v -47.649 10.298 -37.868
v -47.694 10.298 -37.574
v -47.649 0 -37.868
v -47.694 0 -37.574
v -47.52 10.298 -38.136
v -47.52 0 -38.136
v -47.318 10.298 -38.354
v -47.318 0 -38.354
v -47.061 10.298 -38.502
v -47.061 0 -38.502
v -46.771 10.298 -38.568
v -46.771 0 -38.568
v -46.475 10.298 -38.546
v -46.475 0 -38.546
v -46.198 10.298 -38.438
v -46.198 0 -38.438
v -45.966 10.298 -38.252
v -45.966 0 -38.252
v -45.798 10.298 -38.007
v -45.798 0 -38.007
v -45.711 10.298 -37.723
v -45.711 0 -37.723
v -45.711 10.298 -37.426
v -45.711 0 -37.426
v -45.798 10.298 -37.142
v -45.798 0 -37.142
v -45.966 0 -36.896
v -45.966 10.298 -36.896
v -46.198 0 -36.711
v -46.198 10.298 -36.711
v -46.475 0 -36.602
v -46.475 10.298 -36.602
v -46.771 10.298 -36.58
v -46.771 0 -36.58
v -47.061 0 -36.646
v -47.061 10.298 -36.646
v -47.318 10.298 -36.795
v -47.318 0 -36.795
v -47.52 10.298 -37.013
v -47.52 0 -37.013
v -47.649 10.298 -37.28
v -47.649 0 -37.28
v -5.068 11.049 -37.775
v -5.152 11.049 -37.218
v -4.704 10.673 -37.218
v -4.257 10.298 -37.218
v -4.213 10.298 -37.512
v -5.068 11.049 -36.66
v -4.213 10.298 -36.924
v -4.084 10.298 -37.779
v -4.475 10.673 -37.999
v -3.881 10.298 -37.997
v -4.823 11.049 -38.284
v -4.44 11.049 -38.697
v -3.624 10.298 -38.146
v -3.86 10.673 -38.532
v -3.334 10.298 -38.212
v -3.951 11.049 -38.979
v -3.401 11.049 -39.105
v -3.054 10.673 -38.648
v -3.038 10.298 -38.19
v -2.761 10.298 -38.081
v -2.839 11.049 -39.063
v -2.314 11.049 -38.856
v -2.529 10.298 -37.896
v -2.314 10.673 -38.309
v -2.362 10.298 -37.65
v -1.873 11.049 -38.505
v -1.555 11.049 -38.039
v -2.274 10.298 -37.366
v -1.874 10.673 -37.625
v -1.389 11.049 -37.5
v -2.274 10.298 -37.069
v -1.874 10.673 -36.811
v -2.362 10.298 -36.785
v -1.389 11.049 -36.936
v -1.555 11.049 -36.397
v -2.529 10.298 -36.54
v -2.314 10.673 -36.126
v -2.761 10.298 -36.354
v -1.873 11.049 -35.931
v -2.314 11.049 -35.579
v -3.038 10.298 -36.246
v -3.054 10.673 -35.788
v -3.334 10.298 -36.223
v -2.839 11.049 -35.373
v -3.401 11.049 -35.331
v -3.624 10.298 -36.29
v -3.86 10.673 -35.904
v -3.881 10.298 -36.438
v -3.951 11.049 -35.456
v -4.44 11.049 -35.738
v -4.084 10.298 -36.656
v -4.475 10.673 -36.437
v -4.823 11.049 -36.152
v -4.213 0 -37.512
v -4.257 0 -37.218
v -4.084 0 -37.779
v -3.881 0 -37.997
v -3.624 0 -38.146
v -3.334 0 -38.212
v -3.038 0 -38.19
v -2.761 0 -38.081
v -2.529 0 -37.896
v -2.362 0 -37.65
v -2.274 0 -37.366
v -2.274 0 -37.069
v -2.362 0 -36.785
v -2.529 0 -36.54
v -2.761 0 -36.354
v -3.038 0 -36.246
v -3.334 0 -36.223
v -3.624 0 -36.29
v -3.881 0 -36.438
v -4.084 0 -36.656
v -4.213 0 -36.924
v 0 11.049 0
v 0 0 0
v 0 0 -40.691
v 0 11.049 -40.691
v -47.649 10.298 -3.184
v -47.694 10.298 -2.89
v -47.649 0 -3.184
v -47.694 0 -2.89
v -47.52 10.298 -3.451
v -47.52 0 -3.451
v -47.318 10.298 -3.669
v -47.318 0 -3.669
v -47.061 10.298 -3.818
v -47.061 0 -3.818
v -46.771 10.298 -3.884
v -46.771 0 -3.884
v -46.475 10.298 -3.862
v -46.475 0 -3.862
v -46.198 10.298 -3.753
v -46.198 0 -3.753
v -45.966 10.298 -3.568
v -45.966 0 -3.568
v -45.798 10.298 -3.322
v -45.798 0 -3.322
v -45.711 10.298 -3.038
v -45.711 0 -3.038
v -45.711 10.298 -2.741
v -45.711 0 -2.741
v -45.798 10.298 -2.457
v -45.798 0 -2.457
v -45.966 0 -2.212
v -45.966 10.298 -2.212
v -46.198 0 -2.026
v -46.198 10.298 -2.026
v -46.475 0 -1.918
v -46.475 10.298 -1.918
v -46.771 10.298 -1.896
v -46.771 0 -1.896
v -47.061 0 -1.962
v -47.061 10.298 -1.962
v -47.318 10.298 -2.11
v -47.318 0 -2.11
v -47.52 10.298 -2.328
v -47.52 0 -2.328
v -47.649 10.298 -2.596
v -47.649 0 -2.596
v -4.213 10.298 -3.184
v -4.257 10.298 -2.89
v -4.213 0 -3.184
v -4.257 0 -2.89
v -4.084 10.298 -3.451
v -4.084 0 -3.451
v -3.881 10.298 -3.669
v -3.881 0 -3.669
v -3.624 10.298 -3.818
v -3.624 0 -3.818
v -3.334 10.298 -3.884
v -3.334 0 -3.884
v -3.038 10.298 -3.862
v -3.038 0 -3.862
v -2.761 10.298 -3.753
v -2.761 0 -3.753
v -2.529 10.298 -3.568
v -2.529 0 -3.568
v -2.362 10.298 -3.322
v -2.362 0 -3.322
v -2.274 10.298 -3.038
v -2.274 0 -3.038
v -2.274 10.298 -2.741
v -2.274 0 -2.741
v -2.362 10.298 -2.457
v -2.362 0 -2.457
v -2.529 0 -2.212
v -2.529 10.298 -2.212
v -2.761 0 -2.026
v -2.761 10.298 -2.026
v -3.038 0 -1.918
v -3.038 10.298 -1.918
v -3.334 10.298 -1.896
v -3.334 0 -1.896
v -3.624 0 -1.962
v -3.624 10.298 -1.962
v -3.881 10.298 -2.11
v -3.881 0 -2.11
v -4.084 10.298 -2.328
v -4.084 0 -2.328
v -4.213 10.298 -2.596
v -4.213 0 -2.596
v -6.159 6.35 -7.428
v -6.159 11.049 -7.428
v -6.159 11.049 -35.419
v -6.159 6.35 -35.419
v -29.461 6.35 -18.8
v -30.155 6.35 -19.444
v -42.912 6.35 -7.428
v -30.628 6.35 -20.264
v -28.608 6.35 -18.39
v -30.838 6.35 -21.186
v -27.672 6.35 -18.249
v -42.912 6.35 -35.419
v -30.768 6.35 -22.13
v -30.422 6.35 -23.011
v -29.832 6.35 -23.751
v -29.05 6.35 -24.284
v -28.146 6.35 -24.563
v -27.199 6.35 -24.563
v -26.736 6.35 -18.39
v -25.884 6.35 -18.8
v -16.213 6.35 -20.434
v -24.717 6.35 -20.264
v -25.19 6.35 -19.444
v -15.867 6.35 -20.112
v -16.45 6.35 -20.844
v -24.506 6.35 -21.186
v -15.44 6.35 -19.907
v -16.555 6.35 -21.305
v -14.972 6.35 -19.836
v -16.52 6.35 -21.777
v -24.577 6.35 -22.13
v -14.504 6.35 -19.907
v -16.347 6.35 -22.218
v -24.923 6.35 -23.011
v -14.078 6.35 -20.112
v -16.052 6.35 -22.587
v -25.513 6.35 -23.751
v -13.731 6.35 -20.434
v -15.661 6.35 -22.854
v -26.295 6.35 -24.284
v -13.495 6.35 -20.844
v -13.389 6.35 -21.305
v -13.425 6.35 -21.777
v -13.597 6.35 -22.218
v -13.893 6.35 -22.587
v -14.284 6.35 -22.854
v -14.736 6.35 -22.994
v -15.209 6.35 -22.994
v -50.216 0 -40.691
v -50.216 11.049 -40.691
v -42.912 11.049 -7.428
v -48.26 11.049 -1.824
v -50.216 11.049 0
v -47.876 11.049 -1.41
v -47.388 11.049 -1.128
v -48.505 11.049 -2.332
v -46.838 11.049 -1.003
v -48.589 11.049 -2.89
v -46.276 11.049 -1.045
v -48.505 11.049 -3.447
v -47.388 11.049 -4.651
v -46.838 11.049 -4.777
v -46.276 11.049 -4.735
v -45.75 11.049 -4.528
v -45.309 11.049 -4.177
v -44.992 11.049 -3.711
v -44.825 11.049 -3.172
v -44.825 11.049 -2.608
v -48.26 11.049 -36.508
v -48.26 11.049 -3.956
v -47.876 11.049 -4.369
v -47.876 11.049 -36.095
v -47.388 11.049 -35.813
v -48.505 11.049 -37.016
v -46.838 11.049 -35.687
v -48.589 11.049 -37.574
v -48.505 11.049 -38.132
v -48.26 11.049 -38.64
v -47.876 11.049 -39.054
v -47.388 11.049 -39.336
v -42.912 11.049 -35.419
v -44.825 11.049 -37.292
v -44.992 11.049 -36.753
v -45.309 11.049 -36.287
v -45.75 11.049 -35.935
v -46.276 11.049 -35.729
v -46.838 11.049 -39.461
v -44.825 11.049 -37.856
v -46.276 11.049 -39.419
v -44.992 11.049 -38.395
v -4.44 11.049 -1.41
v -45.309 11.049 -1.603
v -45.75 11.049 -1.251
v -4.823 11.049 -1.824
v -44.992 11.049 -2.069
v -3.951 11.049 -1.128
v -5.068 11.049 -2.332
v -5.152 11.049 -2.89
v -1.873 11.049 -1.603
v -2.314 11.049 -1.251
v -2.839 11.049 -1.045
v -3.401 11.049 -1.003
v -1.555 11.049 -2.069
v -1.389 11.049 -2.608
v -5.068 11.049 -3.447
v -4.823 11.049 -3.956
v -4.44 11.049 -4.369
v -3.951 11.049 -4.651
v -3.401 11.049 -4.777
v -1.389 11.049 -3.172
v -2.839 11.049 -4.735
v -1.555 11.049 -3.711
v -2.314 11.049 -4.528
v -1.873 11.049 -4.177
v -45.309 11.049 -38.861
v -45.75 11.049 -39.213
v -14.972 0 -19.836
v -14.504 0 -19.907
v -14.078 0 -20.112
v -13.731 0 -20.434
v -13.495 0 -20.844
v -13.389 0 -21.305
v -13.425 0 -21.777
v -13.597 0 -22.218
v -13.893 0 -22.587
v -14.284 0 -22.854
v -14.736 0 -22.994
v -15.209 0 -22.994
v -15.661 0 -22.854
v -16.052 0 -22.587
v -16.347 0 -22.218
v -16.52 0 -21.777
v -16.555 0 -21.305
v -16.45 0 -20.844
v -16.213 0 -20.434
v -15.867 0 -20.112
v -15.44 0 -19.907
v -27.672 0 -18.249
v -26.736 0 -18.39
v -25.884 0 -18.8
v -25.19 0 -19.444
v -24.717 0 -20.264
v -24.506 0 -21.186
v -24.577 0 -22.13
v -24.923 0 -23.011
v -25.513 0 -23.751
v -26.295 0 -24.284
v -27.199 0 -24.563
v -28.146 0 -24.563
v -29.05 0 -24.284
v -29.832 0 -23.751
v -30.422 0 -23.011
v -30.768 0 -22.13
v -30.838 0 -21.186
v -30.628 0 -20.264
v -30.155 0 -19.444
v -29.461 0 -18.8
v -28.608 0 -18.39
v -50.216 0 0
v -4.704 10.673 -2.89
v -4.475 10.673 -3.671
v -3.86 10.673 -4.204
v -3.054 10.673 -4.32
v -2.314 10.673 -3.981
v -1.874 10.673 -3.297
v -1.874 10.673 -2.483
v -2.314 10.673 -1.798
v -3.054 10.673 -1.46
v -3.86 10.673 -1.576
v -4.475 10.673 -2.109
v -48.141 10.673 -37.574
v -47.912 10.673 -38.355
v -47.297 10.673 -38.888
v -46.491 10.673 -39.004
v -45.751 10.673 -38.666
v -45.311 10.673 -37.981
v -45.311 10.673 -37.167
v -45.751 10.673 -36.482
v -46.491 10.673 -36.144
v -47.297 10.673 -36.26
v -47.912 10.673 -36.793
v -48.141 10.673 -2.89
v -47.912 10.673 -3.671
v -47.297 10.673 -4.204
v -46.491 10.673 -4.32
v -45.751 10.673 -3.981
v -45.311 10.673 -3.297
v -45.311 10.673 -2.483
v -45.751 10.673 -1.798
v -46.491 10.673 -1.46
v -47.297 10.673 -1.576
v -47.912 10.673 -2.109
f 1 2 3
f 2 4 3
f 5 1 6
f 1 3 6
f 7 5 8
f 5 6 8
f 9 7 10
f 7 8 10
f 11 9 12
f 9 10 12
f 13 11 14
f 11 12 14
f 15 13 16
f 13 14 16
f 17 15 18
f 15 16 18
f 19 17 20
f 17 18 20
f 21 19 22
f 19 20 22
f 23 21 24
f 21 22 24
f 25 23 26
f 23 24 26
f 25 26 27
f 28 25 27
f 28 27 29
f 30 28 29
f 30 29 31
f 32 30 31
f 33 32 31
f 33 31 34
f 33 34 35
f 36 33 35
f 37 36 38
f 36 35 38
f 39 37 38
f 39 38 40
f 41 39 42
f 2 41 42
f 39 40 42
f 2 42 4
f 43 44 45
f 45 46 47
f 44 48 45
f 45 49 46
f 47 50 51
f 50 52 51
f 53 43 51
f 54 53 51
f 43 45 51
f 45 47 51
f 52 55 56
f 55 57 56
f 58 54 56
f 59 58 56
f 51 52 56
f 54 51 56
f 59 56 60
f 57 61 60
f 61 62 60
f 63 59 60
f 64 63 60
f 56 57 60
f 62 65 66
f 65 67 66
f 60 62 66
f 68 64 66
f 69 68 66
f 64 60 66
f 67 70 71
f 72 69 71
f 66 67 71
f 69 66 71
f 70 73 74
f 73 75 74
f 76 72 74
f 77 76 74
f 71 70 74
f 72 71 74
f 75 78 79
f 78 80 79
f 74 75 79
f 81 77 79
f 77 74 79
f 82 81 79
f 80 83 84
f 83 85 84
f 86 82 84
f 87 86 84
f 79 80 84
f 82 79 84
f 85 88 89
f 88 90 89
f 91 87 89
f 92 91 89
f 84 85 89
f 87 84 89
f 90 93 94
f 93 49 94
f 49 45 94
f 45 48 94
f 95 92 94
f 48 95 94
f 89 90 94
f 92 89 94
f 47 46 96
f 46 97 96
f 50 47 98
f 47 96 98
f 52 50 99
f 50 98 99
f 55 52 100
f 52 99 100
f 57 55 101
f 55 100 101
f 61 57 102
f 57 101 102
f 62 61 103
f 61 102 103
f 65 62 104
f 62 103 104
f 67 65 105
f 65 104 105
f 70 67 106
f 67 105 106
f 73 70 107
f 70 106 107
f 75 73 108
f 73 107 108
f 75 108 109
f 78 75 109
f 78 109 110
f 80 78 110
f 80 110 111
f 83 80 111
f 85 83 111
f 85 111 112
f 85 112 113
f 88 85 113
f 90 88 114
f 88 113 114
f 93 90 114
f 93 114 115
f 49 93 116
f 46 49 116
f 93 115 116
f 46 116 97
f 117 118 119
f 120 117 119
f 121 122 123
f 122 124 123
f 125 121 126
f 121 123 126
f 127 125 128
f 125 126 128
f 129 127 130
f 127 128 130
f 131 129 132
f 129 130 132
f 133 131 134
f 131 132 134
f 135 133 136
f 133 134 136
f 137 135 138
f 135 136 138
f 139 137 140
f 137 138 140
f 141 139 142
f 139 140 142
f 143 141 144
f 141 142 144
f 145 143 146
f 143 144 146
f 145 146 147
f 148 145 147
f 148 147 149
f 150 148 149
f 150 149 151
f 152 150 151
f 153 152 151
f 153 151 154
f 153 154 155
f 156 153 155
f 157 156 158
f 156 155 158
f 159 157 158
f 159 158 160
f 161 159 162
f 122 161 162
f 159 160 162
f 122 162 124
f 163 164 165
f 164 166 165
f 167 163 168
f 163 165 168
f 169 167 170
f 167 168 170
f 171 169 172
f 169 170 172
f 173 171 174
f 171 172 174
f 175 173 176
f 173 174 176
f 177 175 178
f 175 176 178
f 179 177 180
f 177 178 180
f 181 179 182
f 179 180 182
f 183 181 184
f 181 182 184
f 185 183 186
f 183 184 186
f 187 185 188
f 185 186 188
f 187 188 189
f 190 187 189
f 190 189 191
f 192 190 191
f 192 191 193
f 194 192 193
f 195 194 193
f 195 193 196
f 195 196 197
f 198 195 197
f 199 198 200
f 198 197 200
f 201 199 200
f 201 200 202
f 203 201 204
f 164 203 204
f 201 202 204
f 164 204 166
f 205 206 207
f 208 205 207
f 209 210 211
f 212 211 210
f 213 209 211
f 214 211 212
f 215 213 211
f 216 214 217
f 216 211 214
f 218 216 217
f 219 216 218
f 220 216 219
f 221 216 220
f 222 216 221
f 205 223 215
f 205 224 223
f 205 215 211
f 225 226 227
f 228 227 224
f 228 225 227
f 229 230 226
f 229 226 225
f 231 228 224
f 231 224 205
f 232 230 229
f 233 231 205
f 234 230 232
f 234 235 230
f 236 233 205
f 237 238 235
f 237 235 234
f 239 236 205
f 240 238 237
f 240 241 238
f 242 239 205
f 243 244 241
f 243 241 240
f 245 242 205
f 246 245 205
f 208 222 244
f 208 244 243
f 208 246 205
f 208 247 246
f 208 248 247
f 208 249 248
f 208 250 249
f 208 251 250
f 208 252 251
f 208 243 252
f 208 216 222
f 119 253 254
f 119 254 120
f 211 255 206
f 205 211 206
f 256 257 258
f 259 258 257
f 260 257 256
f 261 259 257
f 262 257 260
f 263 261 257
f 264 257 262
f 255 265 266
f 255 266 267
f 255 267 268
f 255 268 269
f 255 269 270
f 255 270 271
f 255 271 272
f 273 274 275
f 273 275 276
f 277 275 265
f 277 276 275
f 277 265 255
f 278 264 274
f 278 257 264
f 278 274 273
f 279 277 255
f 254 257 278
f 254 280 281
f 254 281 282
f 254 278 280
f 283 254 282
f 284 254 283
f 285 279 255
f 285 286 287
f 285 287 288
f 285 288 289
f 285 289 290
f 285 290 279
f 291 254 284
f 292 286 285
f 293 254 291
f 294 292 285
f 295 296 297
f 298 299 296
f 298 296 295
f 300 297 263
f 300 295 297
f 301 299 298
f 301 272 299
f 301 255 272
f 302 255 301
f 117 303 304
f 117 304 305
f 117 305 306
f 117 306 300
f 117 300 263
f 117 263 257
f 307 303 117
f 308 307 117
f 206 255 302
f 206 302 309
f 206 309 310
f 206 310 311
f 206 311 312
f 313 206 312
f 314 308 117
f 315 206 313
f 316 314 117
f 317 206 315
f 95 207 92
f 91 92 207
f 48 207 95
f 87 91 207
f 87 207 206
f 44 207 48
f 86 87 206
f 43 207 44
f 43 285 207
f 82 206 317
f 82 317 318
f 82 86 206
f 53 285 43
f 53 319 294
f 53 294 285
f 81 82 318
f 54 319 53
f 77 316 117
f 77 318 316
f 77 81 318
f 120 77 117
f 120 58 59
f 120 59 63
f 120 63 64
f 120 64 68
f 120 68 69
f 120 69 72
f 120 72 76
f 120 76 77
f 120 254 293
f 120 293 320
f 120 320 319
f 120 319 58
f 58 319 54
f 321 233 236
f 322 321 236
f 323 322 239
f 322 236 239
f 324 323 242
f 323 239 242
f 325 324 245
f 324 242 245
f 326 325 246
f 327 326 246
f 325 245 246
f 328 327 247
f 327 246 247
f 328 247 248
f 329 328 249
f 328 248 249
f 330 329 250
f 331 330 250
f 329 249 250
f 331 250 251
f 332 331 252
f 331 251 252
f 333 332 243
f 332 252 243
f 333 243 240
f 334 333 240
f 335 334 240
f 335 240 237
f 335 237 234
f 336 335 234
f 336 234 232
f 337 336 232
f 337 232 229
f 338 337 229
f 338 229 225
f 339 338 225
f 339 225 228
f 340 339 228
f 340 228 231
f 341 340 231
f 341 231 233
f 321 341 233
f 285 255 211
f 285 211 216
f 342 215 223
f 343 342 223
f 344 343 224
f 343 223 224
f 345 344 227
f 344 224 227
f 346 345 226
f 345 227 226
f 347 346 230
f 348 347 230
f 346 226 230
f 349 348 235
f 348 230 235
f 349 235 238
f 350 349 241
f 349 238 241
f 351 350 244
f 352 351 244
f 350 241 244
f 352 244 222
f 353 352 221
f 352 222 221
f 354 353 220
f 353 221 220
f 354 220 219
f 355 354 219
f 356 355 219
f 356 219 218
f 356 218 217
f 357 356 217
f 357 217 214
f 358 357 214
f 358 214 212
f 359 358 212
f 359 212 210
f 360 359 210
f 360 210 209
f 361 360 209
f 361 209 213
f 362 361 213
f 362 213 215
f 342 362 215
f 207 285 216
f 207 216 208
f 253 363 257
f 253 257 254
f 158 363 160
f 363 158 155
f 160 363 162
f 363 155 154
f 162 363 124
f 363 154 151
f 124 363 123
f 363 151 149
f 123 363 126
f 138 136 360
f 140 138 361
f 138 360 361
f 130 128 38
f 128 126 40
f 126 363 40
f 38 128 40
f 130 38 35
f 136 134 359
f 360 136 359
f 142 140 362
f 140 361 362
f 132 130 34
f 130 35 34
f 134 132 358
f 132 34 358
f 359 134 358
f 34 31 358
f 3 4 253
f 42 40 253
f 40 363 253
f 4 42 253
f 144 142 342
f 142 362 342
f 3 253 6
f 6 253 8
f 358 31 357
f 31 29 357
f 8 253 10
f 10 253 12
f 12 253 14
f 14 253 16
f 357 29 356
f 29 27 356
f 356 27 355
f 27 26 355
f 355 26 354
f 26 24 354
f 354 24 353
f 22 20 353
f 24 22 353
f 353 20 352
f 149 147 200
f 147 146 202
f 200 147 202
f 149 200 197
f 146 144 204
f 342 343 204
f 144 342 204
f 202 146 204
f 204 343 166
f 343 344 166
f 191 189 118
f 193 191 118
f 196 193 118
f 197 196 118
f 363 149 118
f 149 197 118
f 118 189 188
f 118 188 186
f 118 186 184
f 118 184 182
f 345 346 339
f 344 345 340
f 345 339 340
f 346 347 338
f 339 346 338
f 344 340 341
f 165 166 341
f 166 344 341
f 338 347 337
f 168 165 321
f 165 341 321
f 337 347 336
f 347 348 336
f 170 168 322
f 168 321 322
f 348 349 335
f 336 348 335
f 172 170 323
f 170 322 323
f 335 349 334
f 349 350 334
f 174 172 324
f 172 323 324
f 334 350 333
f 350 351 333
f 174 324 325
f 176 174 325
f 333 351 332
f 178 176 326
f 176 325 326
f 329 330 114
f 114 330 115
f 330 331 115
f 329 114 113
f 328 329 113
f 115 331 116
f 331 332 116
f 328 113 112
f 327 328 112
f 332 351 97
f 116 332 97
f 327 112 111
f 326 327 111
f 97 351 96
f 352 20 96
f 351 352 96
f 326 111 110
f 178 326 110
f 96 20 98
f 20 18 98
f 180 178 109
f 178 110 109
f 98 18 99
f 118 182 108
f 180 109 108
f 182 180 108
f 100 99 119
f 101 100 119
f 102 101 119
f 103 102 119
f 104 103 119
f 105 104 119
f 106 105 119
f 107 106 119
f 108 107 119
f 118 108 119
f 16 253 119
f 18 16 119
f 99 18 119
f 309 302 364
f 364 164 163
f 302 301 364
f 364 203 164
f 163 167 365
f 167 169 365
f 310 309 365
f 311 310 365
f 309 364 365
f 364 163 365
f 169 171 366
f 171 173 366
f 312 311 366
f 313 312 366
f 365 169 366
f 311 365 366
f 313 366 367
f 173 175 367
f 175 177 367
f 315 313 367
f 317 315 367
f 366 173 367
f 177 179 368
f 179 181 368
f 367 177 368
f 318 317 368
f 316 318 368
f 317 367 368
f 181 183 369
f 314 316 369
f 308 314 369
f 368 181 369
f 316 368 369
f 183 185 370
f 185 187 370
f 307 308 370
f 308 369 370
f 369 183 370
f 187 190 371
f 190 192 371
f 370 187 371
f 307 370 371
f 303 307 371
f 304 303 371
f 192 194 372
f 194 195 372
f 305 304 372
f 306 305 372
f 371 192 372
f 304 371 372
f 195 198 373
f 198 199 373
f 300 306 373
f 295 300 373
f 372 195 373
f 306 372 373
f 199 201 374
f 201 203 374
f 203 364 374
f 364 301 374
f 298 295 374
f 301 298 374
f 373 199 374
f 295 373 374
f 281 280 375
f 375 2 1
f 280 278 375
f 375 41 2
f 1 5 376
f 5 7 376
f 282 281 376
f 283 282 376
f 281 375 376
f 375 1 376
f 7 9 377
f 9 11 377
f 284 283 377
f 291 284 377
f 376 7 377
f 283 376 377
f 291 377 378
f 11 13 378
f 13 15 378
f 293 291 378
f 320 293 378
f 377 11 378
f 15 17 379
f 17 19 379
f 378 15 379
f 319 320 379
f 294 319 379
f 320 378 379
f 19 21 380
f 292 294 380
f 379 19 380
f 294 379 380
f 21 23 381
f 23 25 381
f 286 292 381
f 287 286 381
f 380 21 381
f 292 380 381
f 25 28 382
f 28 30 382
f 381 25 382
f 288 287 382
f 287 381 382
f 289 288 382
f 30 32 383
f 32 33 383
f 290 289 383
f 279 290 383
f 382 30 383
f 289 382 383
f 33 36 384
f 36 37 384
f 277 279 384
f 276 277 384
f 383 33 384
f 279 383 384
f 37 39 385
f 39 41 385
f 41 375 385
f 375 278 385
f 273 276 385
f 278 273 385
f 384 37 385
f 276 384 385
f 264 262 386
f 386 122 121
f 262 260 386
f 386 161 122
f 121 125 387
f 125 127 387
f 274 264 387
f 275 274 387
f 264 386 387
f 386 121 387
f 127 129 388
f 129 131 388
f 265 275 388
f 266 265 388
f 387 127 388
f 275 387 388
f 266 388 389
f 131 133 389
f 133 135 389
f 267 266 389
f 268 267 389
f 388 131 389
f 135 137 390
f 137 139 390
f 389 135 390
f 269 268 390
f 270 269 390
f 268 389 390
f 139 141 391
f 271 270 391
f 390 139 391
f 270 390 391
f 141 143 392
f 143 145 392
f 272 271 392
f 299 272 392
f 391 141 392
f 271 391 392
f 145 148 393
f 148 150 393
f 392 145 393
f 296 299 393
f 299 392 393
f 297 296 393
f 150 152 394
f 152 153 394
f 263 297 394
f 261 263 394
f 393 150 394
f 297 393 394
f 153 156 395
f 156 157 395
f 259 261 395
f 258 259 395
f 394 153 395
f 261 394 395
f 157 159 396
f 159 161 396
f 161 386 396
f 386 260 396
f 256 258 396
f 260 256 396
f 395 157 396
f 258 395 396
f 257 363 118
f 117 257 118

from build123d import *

# Parameters (mm, degrees)
SKETCH1_W                       = 50.2158
SKETCH1_H                       = 40.6908
BOSS_EXTRUDE1_DEPTH             = 11.049
SKETCH2_W                       = 36.7538
SKETCH2_H                       = 27.9908
CUT_EXTRUDE1_DEPTH              = 4.699
SKETCH3_R                       = 3.175
SKETCH3_R_2                     = 1.5875
CUT_EXTRUDE2_DEPTH              = 65.943746999
F_3_48_TAPPED_HOLE1_D           = 1.9939
F_3_48_TAPPED_HOLE1_CSINK_D     = 3.7846
F_3_48_TAPPED_HOLE1_CSINK_ANGLE = 100


with BuildPart() as part:
    # Sketch1 → Boss-Extrude1 (new body)
    with BuildSketch(Plane(origin=(0, 0, 0), x_dir=(1, 0, 0), z_dir=(0, 1, 0))):
        with Locations((-25.1079, 20.3454)):
            Rectangle(SKETCH1_W, SKETCH1_H)
    extrude(amount=BOSS_EXTRUDE1_DEPTH)

    # Sketch2 → Cut-Extrude1 (cut)
    with BuildSketch(Plane(origin=(0, 11.049, 0), x_dir=(1, 0, 0), z_dir=(0, 1, 0))):
        with Locations((-24.535409395, 21.423766617)):
            Rectangle(SKETCH2_W, SKETCH2_H)
    extrude(amount=-CUT_EXTRUDE1_DEPTH, mode=Mode.SUBTRACT)

    # Sketch3 → Cut-Extrude2 (cut, through all)
    with BuildSketch(Plane(origin=(0, 6.35, 0), x_dir=(1, 0, 0), z_dir=(0, 1, 0))):
        with Locations(Location((-27.672309395, 21.423766617, 0), (0, 0, 270))):
            Circle(SKETCH3_R)
        with Locations(Location((-14.972309395, 21.423766617, 0), (0, 0, 270))):
            Circle(SKETCH3_R_2)
    extrude(amount=-CUT_EXTRUDE2_DEPTH, mode=Mode.SUBTRACT)

    # #3-48 Tapped Hole1 (through all)
    with Locations(Plane(origin=(0, 11.049, 0), x_dir=(1, 0, 0), z_dir=(0, 1, 0))):
        with Locations((-46.696611007, 37.574228679), (-3.259865138, 37.217658377), (-46.696611007, 2.889662947), (-3.259865138, 2.889662947)):
            CounterSinkHole(F_3_48_TAPPED_HOLE1_D / 2, F_3_48_TAPPED_HOLE1_CSINK_D / 2, counter_sink_angle=F_3_48_TAPPED_HOLE1_CSINK_ANGLE)


solid = part.part
